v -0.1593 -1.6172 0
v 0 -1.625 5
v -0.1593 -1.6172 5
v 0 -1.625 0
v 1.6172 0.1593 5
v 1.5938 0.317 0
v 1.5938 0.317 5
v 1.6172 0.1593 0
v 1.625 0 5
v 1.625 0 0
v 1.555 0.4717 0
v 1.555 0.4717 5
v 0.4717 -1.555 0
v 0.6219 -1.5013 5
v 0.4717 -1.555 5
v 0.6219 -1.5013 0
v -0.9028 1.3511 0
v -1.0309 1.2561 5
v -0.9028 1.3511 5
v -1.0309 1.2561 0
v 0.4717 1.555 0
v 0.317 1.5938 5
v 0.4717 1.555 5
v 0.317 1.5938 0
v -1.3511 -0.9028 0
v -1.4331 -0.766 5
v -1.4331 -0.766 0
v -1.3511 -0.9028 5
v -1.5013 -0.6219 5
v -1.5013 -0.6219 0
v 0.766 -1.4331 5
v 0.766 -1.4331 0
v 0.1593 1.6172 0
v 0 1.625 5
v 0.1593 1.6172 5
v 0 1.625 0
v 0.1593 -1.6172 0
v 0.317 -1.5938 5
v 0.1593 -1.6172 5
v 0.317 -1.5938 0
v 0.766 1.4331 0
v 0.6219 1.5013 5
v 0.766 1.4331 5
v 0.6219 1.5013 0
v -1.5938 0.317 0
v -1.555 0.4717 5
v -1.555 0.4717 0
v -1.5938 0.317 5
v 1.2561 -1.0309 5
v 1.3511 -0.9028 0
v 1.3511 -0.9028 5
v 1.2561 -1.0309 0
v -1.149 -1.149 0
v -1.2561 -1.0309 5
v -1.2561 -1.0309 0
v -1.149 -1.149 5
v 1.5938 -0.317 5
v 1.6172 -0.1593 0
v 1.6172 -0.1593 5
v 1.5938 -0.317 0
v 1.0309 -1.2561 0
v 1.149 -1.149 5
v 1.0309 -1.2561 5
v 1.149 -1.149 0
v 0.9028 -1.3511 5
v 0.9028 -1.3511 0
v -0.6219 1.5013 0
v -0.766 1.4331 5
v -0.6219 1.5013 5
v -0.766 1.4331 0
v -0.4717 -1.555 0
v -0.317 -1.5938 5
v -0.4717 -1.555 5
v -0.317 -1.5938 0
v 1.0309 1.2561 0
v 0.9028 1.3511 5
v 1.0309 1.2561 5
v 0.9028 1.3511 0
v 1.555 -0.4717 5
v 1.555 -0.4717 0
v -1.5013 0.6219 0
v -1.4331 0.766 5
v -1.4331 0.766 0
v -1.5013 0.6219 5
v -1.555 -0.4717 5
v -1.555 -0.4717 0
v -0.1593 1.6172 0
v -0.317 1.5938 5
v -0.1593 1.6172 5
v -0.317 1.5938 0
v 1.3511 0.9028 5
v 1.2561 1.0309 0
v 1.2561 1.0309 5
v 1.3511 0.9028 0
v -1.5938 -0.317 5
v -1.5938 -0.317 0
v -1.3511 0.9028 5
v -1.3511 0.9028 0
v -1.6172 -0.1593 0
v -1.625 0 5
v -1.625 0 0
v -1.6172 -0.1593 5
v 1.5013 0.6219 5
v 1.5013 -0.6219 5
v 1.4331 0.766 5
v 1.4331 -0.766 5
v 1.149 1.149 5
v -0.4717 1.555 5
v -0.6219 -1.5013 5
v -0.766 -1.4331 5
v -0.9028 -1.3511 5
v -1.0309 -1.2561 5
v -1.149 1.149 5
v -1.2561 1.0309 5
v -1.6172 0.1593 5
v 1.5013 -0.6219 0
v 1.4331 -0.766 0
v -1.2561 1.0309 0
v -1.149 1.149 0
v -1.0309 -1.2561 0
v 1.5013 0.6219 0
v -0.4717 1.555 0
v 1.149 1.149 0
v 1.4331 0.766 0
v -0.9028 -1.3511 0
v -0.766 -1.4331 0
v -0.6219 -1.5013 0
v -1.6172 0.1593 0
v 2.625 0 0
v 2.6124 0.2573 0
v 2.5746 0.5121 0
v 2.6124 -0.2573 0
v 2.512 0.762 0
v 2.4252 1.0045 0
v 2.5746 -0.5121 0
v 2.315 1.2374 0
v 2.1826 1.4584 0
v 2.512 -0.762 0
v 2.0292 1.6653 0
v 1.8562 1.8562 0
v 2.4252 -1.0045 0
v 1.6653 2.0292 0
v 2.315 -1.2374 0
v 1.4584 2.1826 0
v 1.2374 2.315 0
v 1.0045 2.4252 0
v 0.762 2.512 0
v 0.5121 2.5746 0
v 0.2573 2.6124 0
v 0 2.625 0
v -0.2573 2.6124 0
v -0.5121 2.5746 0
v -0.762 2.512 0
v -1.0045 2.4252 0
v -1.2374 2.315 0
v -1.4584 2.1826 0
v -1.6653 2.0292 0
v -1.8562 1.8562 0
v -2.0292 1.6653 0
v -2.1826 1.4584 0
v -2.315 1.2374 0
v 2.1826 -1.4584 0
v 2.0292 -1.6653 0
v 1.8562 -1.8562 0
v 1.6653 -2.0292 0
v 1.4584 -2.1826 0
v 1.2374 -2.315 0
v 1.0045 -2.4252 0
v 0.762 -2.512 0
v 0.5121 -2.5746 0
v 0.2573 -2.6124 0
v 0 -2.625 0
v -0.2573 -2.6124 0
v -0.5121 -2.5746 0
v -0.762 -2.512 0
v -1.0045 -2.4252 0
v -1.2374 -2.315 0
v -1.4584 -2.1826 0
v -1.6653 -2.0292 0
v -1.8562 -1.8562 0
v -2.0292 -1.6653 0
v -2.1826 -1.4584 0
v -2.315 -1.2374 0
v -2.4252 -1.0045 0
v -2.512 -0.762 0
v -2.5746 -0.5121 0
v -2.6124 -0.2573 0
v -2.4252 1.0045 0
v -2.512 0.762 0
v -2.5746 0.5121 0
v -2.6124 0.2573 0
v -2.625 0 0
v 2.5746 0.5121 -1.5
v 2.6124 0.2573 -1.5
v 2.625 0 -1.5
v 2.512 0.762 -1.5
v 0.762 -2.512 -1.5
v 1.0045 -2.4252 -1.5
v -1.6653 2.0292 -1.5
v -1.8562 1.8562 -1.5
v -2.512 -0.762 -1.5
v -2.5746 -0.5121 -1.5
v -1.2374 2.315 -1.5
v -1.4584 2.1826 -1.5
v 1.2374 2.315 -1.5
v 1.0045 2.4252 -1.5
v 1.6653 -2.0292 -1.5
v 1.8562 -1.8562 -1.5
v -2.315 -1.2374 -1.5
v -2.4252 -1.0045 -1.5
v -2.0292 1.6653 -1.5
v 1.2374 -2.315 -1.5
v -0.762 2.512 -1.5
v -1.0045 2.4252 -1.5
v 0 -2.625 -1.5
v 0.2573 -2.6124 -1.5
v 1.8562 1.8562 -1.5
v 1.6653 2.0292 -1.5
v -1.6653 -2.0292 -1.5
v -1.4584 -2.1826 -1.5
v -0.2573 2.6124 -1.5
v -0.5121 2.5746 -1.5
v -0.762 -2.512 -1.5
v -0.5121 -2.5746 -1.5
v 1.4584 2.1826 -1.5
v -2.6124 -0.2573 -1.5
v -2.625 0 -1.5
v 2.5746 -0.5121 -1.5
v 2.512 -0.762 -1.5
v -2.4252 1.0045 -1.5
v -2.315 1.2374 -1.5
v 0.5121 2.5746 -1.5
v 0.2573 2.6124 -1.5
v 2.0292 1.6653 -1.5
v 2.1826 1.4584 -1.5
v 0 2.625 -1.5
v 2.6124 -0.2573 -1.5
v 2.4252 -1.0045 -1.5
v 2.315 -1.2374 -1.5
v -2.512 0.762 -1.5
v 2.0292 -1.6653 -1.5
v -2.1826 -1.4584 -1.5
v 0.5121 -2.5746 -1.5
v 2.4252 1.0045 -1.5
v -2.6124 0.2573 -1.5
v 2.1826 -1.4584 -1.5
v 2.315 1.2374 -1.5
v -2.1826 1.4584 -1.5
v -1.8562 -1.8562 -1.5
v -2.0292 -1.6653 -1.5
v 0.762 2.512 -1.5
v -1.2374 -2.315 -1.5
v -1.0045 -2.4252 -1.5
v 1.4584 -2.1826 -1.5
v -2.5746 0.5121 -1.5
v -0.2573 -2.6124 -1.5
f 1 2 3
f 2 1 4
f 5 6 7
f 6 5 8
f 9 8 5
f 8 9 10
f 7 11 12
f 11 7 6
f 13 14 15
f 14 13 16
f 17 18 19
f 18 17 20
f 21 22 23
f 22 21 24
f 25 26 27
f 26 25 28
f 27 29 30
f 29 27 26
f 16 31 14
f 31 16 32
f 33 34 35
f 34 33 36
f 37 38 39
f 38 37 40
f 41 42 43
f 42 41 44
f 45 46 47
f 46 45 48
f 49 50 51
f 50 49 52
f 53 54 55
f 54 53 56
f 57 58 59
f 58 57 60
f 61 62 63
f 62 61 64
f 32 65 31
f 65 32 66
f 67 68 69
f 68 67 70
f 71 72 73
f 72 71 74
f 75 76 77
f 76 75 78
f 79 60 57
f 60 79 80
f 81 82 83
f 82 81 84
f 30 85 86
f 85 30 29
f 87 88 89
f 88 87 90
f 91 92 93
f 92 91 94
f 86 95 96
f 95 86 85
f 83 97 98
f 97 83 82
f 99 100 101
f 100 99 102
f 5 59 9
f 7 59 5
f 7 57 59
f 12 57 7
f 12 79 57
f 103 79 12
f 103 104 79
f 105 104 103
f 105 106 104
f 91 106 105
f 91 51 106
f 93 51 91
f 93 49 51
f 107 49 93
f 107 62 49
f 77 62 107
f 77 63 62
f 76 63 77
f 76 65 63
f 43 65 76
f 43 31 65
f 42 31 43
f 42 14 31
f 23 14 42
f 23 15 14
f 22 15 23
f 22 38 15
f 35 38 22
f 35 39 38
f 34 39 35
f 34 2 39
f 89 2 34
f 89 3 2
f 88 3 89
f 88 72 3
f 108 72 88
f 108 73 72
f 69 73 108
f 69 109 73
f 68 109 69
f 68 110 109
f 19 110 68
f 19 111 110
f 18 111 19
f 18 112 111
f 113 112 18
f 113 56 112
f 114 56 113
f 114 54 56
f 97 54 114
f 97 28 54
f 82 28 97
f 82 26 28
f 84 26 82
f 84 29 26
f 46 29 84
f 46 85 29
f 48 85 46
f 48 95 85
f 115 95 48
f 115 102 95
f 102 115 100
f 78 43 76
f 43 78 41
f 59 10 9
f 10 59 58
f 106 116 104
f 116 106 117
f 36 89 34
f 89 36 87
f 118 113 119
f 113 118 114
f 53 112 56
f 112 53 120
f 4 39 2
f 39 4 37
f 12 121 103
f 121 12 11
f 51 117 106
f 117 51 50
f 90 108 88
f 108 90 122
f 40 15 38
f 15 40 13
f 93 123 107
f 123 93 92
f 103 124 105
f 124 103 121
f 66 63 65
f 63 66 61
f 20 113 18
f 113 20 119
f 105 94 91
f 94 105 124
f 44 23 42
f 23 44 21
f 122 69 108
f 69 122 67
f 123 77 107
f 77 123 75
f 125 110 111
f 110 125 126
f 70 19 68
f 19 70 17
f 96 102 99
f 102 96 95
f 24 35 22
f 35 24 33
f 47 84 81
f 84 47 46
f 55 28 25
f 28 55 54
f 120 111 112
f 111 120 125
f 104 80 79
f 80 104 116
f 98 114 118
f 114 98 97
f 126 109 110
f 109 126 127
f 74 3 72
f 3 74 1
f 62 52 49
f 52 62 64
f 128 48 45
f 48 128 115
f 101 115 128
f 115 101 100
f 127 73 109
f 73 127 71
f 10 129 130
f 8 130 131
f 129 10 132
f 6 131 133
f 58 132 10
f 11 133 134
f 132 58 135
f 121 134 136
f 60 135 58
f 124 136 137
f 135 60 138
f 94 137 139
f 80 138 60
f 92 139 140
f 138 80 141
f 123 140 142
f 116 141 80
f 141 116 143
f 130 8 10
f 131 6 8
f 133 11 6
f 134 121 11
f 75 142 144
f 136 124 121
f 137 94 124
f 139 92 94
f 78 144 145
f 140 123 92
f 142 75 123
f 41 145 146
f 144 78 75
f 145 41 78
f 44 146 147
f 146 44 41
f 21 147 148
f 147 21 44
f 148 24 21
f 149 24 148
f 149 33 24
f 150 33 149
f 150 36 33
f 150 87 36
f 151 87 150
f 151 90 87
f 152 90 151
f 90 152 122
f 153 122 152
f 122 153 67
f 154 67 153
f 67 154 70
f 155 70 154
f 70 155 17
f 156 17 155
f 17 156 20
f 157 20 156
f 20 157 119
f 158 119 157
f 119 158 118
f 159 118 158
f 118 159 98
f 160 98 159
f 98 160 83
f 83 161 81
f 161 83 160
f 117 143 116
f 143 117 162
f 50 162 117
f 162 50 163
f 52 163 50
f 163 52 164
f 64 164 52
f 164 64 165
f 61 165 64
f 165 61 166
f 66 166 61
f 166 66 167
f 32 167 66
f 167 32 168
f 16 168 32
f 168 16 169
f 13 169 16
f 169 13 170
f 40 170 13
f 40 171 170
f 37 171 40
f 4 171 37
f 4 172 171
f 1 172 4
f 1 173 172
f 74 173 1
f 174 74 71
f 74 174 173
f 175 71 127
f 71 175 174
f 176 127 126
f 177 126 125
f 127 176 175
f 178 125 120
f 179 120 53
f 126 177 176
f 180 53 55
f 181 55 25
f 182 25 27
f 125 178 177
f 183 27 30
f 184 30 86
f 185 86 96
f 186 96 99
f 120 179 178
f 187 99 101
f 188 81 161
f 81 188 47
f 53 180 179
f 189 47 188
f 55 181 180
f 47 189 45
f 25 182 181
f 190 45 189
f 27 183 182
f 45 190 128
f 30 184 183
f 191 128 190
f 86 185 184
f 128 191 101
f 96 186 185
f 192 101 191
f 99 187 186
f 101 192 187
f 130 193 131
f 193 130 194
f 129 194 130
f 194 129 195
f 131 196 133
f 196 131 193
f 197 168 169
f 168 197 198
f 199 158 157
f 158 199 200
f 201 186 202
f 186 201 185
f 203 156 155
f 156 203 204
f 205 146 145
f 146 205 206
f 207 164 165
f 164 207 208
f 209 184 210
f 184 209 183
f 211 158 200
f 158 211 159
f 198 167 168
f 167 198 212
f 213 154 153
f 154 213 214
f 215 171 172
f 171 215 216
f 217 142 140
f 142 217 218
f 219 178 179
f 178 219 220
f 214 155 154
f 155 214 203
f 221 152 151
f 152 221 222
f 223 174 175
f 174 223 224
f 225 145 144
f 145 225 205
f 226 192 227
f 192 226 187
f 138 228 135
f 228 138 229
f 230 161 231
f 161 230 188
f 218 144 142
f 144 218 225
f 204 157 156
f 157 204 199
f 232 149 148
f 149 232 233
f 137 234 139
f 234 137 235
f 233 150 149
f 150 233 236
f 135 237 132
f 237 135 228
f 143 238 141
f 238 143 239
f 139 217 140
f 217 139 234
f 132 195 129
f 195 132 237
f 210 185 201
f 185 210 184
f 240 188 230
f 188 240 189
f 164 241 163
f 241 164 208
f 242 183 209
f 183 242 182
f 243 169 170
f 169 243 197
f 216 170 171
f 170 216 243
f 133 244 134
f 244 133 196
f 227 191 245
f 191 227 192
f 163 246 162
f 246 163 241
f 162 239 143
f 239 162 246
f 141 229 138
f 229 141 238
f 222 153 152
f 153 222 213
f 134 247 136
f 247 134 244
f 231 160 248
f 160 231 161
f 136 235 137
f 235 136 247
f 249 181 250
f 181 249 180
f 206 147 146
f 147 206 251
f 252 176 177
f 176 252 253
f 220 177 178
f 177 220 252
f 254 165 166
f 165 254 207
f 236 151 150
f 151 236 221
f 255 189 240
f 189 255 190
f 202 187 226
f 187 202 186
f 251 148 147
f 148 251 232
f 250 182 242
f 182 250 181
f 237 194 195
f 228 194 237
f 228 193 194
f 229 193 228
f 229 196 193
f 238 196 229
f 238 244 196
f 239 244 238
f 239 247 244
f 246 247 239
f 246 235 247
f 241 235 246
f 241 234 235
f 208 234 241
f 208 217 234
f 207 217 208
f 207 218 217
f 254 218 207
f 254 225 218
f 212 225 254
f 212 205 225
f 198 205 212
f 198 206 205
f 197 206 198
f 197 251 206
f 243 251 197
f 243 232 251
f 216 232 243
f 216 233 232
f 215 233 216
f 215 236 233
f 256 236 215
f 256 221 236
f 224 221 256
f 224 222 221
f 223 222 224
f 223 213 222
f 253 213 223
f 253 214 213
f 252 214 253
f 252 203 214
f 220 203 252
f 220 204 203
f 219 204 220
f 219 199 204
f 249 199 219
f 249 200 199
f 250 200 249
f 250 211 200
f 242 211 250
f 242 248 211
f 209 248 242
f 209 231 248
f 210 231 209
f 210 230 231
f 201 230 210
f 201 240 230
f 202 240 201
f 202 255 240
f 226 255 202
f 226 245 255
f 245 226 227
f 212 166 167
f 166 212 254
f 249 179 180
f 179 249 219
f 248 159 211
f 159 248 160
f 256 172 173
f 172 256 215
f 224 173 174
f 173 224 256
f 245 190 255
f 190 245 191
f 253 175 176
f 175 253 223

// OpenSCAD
d = 3.25;
dz = 5;
flange_dz = 1.5;

translate([0, 0, dz/2])
    cylinder(h = dz, r = d/2, center = true, $fn = 64);
translate([0, 0, -flange_dz/2])
    cylinder(h = flange_dz, r = d/2 + 1, center = true, $fn = 64);
